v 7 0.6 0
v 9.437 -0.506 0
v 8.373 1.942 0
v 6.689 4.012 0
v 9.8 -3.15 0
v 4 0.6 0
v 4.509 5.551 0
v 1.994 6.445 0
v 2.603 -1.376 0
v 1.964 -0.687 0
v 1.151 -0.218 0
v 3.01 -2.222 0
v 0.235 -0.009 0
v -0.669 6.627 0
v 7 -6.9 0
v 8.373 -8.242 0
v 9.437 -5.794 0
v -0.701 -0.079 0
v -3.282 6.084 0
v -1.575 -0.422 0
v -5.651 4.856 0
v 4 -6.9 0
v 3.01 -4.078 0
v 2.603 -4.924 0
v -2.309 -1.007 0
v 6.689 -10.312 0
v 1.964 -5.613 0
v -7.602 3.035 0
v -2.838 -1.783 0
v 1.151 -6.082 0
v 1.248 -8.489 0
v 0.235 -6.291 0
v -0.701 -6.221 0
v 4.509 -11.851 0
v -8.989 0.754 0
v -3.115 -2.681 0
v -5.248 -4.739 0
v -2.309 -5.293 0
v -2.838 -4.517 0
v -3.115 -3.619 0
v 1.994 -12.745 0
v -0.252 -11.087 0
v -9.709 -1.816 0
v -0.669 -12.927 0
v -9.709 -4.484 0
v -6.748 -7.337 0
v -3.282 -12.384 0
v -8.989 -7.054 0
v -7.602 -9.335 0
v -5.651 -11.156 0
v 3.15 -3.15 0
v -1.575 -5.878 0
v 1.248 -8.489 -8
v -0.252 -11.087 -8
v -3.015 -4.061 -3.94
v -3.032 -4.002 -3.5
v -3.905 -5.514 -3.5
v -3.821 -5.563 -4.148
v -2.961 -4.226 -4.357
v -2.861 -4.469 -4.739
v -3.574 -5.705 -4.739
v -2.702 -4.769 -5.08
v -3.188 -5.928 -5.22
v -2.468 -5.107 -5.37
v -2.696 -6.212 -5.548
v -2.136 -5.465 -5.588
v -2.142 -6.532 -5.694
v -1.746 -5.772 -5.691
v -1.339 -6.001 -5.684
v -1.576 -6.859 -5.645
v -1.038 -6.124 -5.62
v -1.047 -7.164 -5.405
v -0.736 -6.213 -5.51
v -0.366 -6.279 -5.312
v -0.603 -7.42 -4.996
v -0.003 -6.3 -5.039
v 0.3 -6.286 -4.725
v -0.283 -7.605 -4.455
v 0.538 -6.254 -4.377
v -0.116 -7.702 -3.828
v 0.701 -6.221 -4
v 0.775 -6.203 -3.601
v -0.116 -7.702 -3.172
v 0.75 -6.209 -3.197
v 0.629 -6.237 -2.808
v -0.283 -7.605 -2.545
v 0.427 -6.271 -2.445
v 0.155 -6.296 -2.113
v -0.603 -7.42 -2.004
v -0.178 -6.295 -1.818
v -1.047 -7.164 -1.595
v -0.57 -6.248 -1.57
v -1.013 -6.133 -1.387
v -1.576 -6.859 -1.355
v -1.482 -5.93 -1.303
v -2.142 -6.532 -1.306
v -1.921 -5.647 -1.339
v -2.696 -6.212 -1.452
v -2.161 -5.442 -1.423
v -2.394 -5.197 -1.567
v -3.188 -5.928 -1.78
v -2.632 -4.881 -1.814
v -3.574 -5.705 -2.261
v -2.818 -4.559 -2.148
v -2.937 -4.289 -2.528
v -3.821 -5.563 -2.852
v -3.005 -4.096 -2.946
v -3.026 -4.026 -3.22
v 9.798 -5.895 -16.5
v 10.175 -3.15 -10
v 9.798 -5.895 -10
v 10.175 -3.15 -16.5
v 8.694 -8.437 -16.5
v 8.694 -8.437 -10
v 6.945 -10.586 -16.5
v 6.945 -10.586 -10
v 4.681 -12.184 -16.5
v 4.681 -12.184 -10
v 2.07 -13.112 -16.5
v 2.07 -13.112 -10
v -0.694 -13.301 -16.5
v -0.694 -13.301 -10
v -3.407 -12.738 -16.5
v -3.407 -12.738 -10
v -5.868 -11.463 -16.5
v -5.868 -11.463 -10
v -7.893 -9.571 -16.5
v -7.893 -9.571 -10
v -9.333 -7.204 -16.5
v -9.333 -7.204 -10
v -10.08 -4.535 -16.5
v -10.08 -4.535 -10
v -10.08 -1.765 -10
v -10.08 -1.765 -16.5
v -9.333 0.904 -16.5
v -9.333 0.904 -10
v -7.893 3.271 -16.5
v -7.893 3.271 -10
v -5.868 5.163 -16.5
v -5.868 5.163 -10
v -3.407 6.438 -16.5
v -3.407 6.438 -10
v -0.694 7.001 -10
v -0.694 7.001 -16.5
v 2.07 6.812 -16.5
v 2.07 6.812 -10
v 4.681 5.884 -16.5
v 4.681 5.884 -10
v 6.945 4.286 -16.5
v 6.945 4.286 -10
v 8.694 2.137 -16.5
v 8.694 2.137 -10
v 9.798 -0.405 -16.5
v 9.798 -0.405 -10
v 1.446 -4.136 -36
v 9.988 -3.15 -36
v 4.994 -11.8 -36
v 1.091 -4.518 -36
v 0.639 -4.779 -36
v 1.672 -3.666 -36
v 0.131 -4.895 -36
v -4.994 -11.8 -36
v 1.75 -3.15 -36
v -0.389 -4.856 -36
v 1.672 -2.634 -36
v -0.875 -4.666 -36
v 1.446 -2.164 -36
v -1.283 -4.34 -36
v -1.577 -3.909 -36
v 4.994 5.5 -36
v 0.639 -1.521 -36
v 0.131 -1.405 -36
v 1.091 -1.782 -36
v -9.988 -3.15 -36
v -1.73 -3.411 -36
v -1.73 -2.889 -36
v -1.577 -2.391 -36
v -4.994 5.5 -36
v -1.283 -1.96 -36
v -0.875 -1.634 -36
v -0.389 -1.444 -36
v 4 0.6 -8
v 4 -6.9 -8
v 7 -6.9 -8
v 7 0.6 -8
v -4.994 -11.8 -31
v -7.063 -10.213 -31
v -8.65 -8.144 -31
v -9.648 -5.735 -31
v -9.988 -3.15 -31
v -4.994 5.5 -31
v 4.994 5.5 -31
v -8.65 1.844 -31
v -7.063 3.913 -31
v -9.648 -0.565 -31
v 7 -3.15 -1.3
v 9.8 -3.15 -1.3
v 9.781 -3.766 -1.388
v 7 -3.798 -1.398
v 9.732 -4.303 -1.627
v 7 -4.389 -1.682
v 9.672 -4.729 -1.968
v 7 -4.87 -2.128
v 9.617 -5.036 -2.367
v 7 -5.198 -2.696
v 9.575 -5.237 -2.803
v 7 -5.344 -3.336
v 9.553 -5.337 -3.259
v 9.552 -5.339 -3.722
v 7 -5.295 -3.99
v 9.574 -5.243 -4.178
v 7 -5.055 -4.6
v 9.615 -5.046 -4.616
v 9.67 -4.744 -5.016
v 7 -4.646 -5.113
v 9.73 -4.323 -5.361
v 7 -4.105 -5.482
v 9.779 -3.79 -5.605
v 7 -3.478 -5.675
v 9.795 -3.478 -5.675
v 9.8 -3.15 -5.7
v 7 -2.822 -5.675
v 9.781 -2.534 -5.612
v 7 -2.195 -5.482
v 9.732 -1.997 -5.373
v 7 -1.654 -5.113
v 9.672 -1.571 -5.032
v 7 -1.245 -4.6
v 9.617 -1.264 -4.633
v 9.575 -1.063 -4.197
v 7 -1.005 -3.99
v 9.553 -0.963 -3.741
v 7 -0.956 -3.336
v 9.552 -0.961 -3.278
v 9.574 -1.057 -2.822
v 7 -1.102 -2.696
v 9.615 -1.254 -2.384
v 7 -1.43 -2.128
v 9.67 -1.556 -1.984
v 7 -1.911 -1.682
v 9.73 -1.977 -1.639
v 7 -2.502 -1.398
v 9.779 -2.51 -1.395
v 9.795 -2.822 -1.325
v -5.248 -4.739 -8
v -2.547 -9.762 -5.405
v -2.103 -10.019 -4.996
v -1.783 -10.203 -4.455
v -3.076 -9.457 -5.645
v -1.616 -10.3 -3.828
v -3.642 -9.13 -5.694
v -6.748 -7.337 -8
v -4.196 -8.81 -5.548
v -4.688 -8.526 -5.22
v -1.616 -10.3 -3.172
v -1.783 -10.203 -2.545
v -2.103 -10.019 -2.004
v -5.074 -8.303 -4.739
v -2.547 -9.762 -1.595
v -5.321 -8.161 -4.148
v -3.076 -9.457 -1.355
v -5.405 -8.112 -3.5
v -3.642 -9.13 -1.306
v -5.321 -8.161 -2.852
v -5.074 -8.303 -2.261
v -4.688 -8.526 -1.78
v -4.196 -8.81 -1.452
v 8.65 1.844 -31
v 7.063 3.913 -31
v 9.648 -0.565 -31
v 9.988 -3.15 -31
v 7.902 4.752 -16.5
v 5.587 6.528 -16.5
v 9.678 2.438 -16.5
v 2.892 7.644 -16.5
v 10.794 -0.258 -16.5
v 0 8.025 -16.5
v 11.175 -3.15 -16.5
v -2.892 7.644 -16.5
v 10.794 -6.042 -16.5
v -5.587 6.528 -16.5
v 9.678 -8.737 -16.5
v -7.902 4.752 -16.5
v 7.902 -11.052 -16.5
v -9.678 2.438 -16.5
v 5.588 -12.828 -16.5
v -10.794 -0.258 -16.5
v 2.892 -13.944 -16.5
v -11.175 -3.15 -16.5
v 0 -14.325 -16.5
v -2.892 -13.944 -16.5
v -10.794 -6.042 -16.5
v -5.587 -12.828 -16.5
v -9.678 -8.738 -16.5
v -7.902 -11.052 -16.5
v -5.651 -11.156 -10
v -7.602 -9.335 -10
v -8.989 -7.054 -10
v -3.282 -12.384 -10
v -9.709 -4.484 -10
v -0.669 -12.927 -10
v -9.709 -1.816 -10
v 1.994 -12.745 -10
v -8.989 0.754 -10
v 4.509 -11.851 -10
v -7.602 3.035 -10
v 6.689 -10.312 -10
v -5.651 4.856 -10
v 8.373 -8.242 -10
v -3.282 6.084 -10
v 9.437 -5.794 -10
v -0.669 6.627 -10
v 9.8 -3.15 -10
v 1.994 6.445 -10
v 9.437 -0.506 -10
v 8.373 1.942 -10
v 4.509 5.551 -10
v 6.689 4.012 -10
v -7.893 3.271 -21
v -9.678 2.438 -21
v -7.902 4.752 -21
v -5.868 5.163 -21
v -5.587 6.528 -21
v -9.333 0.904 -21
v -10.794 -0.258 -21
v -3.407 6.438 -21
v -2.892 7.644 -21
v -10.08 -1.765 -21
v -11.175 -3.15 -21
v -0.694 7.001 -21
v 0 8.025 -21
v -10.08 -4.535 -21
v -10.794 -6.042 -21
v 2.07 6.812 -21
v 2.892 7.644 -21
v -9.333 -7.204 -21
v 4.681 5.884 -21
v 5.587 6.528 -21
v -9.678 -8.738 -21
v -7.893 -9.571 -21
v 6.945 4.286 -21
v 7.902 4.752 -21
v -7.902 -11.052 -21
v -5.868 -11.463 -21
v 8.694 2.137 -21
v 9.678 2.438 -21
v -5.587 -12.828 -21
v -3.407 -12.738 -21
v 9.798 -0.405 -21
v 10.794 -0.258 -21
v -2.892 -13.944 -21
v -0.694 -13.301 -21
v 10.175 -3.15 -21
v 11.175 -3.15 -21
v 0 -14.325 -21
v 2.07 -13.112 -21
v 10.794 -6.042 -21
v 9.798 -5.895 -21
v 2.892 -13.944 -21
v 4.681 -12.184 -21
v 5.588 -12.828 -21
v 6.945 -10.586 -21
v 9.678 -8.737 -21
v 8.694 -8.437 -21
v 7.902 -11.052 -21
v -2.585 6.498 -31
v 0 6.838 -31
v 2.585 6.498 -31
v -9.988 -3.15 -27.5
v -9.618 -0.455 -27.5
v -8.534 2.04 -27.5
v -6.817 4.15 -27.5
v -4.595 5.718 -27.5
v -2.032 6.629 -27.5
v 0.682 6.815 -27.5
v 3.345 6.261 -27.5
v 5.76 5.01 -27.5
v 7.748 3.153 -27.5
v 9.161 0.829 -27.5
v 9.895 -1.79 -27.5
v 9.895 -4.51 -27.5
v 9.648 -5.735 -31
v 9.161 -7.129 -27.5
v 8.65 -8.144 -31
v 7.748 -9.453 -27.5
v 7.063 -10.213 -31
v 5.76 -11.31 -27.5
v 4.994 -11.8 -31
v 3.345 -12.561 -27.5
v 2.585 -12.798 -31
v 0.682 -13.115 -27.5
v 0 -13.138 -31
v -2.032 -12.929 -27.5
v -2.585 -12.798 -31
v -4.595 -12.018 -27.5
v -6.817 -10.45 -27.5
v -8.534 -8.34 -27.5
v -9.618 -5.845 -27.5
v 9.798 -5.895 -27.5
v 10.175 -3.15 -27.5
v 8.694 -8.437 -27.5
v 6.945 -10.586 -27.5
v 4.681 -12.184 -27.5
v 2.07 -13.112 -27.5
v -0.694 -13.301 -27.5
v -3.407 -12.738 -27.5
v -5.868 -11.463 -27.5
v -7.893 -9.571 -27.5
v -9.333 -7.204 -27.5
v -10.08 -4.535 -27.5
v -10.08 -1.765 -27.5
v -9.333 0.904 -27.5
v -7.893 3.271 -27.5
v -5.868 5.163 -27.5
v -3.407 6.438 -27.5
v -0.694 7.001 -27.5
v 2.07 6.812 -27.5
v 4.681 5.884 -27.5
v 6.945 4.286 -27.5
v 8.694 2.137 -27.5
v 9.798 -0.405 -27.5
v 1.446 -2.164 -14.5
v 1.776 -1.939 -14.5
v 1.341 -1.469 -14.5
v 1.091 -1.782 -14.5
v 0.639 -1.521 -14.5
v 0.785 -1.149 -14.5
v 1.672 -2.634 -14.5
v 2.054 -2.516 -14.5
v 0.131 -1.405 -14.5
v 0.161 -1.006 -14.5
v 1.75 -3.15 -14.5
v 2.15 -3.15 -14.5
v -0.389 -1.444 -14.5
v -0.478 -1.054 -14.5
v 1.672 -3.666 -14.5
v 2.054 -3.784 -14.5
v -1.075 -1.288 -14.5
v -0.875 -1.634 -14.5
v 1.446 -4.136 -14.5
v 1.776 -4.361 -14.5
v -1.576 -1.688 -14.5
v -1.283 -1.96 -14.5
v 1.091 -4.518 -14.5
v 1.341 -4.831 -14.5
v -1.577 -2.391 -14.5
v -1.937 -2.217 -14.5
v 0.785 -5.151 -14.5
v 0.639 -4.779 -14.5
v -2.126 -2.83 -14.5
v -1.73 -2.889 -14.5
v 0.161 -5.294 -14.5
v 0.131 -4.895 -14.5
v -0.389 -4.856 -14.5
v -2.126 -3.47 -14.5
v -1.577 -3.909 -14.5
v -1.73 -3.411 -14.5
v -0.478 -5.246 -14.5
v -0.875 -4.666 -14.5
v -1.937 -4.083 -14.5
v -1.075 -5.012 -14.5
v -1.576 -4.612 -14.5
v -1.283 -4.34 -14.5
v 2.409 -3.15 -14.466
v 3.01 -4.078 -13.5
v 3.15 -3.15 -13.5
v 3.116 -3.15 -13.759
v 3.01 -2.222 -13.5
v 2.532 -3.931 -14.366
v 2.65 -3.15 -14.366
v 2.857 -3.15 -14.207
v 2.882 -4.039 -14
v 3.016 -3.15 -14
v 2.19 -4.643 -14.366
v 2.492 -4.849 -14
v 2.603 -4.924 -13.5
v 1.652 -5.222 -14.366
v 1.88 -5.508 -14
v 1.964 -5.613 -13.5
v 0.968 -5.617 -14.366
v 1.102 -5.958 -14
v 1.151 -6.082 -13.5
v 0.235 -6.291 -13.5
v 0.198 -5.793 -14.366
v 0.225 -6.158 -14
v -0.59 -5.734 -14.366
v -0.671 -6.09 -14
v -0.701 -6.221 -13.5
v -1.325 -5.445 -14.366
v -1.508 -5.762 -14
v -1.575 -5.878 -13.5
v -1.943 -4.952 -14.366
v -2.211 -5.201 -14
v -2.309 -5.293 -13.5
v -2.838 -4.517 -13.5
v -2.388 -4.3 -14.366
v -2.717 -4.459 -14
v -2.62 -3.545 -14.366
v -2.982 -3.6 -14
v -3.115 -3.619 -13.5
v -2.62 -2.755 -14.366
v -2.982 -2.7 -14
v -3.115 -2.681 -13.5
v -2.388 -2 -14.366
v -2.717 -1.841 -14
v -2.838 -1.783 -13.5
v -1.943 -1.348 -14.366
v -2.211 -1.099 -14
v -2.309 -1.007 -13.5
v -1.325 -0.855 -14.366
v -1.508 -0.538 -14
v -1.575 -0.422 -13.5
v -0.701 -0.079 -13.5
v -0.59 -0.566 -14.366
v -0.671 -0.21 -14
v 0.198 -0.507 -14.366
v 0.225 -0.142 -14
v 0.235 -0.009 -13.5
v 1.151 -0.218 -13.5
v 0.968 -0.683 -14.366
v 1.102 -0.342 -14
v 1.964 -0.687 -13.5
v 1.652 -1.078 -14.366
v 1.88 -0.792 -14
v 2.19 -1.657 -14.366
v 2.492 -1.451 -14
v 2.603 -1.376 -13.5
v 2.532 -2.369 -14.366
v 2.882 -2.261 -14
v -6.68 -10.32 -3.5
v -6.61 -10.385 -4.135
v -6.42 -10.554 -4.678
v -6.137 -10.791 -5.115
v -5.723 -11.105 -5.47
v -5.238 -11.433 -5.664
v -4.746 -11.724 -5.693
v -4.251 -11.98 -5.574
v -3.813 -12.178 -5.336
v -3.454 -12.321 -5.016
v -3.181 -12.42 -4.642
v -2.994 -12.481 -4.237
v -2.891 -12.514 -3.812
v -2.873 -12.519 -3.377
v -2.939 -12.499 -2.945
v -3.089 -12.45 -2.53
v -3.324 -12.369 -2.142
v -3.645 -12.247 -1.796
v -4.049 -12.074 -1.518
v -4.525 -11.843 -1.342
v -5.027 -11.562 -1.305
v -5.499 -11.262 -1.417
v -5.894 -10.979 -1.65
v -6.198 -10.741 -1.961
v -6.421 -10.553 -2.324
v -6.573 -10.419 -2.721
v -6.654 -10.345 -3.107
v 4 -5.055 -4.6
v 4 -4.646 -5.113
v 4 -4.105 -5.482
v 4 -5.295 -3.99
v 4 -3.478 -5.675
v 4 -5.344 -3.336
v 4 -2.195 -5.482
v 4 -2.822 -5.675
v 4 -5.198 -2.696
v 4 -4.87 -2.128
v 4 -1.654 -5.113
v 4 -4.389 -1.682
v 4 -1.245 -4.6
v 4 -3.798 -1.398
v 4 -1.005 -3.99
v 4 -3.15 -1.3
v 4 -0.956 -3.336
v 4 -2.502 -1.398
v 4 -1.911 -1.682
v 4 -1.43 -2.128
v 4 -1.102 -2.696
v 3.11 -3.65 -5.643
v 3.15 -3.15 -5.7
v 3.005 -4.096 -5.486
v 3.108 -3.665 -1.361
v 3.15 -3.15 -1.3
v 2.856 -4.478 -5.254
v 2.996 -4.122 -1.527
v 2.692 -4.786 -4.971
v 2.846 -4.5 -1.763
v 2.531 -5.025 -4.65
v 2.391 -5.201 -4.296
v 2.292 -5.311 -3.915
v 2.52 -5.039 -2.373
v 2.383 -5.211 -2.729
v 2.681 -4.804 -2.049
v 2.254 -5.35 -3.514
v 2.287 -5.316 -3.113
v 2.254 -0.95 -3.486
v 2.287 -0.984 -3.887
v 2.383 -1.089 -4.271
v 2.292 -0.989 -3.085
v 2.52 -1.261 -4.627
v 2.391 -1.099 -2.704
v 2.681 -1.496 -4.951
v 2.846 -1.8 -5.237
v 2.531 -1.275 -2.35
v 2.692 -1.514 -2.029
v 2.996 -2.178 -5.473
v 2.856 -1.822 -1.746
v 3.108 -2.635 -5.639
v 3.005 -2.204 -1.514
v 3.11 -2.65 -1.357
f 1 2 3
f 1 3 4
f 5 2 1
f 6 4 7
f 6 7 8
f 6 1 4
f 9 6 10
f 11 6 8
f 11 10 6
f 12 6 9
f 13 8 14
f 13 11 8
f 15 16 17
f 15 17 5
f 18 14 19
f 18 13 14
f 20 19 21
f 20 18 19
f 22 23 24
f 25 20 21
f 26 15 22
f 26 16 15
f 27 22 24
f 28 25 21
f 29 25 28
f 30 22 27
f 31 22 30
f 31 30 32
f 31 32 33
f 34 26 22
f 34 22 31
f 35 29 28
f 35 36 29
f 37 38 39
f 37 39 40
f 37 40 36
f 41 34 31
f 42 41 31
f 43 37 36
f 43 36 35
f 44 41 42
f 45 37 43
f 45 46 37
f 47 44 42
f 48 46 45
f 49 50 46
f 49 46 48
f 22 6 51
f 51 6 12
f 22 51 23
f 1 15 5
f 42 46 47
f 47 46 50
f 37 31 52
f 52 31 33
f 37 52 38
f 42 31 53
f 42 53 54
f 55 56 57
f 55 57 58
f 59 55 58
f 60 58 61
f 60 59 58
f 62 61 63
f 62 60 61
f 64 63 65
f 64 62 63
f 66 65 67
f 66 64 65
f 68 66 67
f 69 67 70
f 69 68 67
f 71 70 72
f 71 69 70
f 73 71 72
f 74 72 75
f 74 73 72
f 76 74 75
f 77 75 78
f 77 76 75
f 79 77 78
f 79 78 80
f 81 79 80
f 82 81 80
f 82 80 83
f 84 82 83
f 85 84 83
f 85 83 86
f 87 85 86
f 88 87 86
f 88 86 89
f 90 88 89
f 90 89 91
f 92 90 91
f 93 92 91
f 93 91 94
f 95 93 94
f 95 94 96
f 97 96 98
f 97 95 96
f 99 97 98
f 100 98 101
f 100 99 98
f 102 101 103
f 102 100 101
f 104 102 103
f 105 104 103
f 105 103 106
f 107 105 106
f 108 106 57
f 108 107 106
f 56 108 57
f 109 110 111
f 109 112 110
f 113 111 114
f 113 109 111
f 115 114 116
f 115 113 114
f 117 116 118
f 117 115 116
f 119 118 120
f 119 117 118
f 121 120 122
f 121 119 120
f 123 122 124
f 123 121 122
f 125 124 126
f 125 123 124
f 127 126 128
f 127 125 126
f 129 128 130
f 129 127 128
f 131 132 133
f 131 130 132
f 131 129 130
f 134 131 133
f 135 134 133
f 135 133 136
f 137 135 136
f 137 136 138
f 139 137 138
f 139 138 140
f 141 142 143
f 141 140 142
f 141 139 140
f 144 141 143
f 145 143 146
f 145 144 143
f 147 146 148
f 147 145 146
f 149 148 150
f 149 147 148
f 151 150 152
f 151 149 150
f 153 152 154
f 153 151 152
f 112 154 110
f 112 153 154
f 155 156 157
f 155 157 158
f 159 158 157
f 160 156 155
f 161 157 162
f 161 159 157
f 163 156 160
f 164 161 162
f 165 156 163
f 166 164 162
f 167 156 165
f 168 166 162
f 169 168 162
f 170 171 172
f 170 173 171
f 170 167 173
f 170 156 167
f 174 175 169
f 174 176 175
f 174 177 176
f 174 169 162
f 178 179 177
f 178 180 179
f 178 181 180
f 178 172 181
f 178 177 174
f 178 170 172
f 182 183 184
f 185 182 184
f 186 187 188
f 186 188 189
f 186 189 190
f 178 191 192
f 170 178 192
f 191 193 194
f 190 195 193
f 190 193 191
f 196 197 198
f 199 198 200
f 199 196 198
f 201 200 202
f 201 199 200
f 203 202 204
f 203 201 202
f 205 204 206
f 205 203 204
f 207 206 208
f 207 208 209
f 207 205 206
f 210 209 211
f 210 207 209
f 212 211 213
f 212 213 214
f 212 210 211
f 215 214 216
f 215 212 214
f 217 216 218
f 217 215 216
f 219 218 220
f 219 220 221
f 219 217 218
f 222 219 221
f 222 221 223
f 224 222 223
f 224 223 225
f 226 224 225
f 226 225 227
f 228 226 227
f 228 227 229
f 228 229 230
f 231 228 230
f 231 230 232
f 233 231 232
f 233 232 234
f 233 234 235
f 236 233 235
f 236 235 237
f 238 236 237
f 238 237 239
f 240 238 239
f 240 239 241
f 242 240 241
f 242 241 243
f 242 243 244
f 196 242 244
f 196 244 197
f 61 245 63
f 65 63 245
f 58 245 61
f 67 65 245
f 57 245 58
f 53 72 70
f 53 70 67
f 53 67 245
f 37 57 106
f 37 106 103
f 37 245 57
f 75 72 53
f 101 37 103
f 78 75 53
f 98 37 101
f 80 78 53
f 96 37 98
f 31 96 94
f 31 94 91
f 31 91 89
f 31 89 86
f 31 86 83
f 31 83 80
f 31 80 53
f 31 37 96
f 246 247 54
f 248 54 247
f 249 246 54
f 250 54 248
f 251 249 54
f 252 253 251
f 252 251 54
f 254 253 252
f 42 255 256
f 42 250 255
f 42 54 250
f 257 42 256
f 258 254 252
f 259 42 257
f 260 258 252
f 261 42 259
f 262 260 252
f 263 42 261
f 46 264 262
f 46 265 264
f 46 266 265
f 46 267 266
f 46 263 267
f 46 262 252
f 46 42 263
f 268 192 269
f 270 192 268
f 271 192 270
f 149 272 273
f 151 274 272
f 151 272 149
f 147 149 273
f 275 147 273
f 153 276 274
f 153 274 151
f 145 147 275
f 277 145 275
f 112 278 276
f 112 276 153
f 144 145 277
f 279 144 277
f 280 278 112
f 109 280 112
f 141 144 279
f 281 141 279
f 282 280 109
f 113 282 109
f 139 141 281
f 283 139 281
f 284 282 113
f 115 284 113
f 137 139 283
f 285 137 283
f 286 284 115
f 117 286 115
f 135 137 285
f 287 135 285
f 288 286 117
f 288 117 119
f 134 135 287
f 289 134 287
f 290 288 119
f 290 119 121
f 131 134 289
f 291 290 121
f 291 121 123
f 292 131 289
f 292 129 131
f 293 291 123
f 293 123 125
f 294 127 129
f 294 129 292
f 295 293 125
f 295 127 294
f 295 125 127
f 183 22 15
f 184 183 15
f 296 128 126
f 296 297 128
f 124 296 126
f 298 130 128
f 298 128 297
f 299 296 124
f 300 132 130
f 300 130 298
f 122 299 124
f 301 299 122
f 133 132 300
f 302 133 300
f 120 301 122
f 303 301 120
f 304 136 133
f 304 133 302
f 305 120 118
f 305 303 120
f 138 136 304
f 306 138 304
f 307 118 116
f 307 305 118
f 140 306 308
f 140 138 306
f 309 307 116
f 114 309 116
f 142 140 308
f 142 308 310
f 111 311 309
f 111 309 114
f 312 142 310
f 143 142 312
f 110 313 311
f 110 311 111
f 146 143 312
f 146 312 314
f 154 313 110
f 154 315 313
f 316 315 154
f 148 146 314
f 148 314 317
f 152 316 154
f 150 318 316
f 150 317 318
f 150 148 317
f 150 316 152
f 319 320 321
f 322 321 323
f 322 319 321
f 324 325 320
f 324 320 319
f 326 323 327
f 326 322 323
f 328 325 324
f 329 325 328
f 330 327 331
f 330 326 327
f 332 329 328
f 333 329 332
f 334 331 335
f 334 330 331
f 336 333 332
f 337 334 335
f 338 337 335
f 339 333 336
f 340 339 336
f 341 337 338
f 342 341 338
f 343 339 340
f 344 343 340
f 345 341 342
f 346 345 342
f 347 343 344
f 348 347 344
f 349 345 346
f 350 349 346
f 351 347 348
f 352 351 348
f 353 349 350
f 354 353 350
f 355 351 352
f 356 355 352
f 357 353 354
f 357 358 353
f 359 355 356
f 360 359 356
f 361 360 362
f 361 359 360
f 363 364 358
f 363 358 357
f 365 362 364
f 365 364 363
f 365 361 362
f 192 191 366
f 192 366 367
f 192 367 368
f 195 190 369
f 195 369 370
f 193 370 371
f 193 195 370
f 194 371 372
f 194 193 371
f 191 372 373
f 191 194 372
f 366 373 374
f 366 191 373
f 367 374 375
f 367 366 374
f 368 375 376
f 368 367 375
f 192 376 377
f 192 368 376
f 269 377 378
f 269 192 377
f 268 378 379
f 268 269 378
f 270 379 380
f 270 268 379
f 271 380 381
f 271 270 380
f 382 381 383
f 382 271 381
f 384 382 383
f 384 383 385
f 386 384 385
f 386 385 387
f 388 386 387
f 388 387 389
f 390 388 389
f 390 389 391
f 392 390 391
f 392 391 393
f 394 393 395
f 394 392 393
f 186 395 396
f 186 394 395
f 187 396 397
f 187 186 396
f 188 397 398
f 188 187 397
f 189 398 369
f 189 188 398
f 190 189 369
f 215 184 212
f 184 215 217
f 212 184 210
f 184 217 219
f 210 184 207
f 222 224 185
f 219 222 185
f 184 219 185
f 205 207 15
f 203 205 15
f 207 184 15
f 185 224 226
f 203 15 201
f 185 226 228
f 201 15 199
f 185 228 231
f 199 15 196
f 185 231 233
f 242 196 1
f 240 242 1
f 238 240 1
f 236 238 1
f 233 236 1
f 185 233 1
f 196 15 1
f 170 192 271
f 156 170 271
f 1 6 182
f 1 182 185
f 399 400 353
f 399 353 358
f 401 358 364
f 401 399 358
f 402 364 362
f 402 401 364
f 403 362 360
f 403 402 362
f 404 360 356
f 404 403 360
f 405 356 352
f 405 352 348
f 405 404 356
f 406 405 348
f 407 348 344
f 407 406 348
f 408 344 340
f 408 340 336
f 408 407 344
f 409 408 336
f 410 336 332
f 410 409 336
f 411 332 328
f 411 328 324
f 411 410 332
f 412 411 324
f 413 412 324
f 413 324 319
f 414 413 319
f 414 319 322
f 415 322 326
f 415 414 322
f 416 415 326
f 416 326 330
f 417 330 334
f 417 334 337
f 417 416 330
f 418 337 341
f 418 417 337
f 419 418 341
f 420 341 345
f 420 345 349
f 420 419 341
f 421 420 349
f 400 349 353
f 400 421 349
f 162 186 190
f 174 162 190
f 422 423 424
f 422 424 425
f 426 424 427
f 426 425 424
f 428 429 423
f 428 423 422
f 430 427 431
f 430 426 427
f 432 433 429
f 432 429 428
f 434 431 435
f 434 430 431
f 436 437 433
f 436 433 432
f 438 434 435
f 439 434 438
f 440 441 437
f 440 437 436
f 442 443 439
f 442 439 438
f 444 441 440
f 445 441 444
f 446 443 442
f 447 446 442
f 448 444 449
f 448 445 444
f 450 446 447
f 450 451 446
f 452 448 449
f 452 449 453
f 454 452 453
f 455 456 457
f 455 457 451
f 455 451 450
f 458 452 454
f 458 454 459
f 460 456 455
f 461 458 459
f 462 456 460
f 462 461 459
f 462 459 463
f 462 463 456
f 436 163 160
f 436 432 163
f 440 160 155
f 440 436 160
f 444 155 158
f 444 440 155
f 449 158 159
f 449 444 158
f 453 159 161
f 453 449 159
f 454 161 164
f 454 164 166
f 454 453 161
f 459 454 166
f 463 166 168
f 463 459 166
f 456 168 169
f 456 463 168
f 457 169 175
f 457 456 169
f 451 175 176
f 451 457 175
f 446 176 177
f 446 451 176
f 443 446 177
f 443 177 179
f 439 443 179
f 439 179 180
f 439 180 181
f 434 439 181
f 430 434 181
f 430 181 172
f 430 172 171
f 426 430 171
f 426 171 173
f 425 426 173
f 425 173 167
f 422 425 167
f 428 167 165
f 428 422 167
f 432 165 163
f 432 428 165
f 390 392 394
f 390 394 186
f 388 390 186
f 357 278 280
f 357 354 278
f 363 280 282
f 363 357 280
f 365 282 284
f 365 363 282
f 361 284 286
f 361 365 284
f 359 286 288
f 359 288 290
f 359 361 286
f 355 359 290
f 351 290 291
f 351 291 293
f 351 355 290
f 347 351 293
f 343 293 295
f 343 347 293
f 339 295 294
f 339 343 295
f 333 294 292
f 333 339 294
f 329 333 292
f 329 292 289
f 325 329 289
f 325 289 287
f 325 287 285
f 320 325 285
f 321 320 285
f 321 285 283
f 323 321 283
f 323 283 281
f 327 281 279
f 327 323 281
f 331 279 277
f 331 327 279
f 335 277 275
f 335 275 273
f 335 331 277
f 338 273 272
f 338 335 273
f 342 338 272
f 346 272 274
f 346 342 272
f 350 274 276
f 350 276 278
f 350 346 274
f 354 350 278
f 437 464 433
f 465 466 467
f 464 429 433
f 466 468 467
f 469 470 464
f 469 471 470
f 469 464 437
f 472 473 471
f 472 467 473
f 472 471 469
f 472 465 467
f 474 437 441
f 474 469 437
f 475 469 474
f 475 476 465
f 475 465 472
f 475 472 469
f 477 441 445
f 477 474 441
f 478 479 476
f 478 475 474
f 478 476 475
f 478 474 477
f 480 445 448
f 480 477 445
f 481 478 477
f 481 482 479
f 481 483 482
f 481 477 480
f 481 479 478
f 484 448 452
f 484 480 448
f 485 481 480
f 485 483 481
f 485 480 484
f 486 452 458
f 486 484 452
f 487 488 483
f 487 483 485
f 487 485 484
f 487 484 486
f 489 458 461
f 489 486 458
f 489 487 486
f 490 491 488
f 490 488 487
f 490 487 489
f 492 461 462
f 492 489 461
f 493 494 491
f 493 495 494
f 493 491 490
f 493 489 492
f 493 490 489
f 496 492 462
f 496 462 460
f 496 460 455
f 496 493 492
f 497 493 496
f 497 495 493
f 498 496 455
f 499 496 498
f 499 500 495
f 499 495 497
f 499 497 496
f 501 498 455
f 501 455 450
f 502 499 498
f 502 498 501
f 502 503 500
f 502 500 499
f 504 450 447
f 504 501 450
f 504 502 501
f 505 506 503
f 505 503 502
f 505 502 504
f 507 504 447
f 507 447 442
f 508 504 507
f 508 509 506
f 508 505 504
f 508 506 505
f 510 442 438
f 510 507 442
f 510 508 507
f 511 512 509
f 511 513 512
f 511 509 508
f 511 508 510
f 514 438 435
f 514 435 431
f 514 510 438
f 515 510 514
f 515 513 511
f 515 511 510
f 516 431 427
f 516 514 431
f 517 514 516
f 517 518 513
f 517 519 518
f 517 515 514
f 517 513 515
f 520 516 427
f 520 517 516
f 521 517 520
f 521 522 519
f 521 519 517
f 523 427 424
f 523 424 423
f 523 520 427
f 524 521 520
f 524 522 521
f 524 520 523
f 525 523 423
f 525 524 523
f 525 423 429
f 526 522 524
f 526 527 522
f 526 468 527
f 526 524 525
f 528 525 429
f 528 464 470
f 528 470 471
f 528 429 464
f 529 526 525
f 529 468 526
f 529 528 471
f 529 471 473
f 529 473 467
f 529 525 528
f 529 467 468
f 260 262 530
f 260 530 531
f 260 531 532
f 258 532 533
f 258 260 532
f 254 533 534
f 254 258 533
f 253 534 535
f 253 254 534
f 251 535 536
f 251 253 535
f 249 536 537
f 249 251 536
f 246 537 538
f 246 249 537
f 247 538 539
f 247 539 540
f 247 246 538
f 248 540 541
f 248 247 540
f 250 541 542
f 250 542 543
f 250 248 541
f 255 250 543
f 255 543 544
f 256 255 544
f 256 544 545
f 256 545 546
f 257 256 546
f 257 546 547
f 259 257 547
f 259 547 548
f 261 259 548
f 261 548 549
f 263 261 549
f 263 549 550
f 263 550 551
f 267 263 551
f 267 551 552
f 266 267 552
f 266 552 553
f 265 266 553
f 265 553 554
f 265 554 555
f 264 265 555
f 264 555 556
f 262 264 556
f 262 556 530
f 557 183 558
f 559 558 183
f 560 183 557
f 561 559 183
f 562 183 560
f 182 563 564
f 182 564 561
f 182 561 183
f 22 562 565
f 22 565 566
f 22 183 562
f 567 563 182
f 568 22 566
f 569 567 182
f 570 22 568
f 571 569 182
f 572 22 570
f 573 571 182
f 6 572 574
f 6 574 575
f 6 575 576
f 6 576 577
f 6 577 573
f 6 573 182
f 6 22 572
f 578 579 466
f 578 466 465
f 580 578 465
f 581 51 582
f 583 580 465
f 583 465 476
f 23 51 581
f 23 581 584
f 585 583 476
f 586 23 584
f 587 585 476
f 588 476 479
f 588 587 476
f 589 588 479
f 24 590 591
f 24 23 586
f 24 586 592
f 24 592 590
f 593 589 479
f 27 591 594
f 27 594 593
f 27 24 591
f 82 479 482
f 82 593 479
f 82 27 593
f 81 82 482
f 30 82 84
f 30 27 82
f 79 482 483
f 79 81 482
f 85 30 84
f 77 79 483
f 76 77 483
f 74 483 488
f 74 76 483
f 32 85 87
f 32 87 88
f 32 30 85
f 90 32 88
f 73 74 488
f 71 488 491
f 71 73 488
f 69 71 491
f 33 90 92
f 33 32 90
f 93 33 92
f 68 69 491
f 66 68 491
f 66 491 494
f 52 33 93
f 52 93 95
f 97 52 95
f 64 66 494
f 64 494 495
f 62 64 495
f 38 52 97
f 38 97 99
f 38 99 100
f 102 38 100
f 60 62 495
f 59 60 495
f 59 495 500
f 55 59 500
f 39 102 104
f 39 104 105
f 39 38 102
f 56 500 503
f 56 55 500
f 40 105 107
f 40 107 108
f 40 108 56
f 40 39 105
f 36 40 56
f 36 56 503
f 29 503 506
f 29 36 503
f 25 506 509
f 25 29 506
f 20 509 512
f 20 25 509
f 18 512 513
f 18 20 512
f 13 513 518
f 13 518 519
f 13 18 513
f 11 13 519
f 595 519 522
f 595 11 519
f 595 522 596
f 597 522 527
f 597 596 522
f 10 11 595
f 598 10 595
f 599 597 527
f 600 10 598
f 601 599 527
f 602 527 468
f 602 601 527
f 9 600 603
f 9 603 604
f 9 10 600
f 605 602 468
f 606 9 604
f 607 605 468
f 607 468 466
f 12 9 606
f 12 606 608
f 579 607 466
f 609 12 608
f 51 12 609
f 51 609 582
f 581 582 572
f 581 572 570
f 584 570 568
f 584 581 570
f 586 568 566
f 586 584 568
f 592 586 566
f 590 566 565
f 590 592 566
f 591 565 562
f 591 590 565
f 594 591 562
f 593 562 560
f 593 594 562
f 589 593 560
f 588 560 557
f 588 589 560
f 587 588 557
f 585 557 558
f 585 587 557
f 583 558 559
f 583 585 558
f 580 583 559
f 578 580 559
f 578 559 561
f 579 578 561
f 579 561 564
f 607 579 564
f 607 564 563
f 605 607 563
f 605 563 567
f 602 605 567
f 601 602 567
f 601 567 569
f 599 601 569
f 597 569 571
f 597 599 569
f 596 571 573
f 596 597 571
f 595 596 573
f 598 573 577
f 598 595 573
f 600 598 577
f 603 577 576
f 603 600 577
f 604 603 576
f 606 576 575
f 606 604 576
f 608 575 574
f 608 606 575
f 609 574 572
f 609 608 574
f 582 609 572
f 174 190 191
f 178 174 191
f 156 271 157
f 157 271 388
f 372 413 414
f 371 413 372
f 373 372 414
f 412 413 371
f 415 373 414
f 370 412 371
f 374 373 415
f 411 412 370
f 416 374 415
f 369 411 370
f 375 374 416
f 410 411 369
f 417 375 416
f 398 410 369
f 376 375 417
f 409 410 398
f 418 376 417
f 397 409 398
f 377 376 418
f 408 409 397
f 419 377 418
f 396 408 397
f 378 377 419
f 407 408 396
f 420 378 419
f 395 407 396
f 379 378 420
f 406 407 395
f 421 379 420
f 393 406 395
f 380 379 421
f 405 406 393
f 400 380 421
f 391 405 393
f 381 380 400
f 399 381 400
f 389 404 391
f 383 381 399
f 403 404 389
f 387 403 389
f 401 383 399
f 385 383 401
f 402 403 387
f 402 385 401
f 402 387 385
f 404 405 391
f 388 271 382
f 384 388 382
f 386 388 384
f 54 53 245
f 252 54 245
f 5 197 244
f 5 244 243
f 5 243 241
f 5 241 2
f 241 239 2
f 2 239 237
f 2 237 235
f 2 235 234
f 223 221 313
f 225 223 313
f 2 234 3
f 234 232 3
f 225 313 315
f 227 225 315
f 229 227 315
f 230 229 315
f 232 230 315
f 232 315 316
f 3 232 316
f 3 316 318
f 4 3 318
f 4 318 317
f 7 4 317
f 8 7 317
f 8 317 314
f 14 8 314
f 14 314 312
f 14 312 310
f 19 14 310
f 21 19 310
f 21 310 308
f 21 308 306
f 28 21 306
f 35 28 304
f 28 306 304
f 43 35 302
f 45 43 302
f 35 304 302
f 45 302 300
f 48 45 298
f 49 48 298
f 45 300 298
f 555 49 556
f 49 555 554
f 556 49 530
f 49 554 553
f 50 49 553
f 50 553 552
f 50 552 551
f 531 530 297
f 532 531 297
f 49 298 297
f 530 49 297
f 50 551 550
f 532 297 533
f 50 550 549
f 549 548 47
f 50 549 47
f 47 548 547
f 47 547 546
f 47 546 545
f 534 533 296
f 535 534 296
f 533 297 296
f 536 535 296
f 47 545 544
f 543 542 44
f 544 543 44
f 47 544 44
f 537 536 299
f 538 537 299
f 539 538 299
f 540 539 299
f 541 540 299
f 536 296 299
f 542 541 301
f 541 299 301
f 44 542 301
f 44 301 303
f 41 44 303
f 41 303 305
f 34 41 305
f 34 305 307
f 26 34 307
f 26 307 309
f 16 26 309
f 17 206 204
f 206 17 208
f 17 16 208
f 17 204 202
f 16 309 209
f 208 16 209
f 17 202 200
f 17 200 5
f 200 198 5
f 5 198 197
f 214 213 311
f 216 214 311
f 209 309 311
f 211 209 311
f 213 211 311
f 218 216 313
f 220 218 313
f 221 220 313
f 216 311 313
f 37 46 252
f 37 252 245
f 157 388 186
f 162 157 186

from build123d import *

# Parameters (mm, degrees)
SKETCH_2_R               = 1.75
EXTRUDE_937_DEPTH        = 5
FILLET_1_R               = 1
SKETCH_9_W               = 3
SKETCH_9_H               = 7.5
CUT_EXTRUDE_1306_DEPTH   = 8
CUT_EXTRUDE_2_DEPTH      = 10
CUT_EXTRUDE_2_DEPTH_BACK = 5
SKETCH_12_R              = 2.2
CUT_EXTRUDE_START        = -10
SKETCH_15_R              = 10.175
SKETCH_15_R_2            = 9.8
CUT_EXTRUDE_1_DEPTH      = 10
SKETCH_16_R              = 2.2
CUT_EXTRUDE_1_2_DEPTH    = 41.324759764
SKETCH_18_R              = 10.175
SKETCH_18_R_2            = 9.988159657
CUT_EXTRUDE_2_2_DEPTH    = 3.5


with BuildPart() as part:
    # Эскиз1 → Revolve 727 (revolve)
    with BuildSketch(Plane(origin=(0, 0, 0), x_dir=(0, 0, -1), z_dir=(1, 0, 0)), mode=Mode.PRIVATE) as revolve_727_sk:
        Polygon((0, 0), (0, 7.025), (16.5, 7.025), (16.5, 8.025), (21, 8.025), (21, 7.025), (31, 7.025), (31, -1.4), (14.5, -1.4), (14.5, 0), align=None)
    revolve(revolve_727_sk.sketch.rotate(Axis((0, -3.15, 0), (0, 0, -1)), 90), axis=Axis((0, -3.15, 0), (0, 0, -1)))

    # Эскиз2 → Extrude 937 (add)
    with BuildSketch(Plane(origin=(0, 0, -31), x_dir=(-1, 0, 0), z_dir=(0, 0, -1))):
        Polygon((4.994079828, 5.5), (-4.994079828, 5.5), (-9.988159657, -3.15), (-4.994079828, -11.8), (4.994079828, -11.8), (9.988159657, -3.15), align=None)
        with Locations(Location((0, -3.15, 0), (0, 0, 180))):
            Circle(SKETCH_2_R, mode=Mode.SUBTRACT)
    extrude(amount=EXTRUDE_937_DEPTH)

    # Скругление1
    fillet_1_edges = [part.edges().sort_by_distance(p)[0] for p in [
        (-3.15, -3.15, -14.5),
    ]]
    fillet(fillet_1_edges, radius=FILLET_1_R)

    # Эскиз9 → Cut-Extrude 1306 (cut)
    with BuildSketch(Plane.XY):
        with Locations((5.5, -3.15)):
            Rectangle(SKETCH_9_W, SKETCH_9_H)
        Polygon((-6.747595264, -7.337177826), (-5.247595264, -4.739101615), (1.247595264, -8.489101615), (-0.252404736, -11.087177826), align=None)
    extrude(amount=-CUT_EXTRUDE_1306_DEPTH, mode=Mode.SUBTRACT)

    # Эскиз12 → Cut-Extrude 2 (cut, two sides: drawn at the far end of the back side and taken through both)
    with BuildSketch(Plane(origin=(-3.363990011, -5.826601615, 0), x_dir=(0.8660254037844364, -0.500000000000004, 0), z_dir=(-0.500000000000004, -0.8660254037844365, 0)).offset(-CUT_EXTRUDE_2_DEPTH_BACK)):
        with Locations(Location((1.575, -3.5, 0), (0, 0, 180))):
            Circle(SKETCH_12_R)
    extrude(amount=CUT_EXTRUDE_2_DEPTH + CUT_EXTRUDE_2_DEPTH_BACK, mode=Mode.SUBTRACT)

    # Эскиз15 → Cut-Extrude 1 (cut)
    with BuildSketch(Plane.XY.offset(CUT_EXTRUDE_START)):
        with Locations((0, -3.15)):
            Circle(SKETCH_15_R)
        with Locations((0, -3.15)):
            Circle(SKETCH_15_R_2, mode=Mode.SUBTRACT)
    extrude(amount=CUT_EXTRUDE_1_DEPTH, mode=Mode.SUBTRACT)

    # Эскиз16 → Cut-Extrude 1 2 (cut, through all)
    with BuildSketch(Plane(origin=(0, 0, 0), x_dir=(0, 0, -1), z_dir=(1, 0, 0))):
        with Locations(Location((3.5, -3.15, 0), (0, 0, 180))):
            Circle(SKETCH_16_R)
    extrude(amount=CUT_EXTRUDE_1_2_DEPTH, mode=Mode.SUBTRACT)

    # Эскиз18 → Cut-Extrude 2 2 (cut)
    with BuildSketch(Plane(origin=(0, 0, -31), x_dir=(-1, 0, 0), z_dir=(0, 0, -1))):
        with Locations(Location((0, -3.15, 0), (0, 0, 180))):
            Circle(SKETCH_18_R)
        with Locations((0, -3.15)):
            Circle(SKETCH_18_R_2, mode=Mode.SUBTRACT)
    extrude(amount=-CUT_EXTRUDE_2_2_DEPTH, mode=Mode.SUBTRACT)


solid = part.part
